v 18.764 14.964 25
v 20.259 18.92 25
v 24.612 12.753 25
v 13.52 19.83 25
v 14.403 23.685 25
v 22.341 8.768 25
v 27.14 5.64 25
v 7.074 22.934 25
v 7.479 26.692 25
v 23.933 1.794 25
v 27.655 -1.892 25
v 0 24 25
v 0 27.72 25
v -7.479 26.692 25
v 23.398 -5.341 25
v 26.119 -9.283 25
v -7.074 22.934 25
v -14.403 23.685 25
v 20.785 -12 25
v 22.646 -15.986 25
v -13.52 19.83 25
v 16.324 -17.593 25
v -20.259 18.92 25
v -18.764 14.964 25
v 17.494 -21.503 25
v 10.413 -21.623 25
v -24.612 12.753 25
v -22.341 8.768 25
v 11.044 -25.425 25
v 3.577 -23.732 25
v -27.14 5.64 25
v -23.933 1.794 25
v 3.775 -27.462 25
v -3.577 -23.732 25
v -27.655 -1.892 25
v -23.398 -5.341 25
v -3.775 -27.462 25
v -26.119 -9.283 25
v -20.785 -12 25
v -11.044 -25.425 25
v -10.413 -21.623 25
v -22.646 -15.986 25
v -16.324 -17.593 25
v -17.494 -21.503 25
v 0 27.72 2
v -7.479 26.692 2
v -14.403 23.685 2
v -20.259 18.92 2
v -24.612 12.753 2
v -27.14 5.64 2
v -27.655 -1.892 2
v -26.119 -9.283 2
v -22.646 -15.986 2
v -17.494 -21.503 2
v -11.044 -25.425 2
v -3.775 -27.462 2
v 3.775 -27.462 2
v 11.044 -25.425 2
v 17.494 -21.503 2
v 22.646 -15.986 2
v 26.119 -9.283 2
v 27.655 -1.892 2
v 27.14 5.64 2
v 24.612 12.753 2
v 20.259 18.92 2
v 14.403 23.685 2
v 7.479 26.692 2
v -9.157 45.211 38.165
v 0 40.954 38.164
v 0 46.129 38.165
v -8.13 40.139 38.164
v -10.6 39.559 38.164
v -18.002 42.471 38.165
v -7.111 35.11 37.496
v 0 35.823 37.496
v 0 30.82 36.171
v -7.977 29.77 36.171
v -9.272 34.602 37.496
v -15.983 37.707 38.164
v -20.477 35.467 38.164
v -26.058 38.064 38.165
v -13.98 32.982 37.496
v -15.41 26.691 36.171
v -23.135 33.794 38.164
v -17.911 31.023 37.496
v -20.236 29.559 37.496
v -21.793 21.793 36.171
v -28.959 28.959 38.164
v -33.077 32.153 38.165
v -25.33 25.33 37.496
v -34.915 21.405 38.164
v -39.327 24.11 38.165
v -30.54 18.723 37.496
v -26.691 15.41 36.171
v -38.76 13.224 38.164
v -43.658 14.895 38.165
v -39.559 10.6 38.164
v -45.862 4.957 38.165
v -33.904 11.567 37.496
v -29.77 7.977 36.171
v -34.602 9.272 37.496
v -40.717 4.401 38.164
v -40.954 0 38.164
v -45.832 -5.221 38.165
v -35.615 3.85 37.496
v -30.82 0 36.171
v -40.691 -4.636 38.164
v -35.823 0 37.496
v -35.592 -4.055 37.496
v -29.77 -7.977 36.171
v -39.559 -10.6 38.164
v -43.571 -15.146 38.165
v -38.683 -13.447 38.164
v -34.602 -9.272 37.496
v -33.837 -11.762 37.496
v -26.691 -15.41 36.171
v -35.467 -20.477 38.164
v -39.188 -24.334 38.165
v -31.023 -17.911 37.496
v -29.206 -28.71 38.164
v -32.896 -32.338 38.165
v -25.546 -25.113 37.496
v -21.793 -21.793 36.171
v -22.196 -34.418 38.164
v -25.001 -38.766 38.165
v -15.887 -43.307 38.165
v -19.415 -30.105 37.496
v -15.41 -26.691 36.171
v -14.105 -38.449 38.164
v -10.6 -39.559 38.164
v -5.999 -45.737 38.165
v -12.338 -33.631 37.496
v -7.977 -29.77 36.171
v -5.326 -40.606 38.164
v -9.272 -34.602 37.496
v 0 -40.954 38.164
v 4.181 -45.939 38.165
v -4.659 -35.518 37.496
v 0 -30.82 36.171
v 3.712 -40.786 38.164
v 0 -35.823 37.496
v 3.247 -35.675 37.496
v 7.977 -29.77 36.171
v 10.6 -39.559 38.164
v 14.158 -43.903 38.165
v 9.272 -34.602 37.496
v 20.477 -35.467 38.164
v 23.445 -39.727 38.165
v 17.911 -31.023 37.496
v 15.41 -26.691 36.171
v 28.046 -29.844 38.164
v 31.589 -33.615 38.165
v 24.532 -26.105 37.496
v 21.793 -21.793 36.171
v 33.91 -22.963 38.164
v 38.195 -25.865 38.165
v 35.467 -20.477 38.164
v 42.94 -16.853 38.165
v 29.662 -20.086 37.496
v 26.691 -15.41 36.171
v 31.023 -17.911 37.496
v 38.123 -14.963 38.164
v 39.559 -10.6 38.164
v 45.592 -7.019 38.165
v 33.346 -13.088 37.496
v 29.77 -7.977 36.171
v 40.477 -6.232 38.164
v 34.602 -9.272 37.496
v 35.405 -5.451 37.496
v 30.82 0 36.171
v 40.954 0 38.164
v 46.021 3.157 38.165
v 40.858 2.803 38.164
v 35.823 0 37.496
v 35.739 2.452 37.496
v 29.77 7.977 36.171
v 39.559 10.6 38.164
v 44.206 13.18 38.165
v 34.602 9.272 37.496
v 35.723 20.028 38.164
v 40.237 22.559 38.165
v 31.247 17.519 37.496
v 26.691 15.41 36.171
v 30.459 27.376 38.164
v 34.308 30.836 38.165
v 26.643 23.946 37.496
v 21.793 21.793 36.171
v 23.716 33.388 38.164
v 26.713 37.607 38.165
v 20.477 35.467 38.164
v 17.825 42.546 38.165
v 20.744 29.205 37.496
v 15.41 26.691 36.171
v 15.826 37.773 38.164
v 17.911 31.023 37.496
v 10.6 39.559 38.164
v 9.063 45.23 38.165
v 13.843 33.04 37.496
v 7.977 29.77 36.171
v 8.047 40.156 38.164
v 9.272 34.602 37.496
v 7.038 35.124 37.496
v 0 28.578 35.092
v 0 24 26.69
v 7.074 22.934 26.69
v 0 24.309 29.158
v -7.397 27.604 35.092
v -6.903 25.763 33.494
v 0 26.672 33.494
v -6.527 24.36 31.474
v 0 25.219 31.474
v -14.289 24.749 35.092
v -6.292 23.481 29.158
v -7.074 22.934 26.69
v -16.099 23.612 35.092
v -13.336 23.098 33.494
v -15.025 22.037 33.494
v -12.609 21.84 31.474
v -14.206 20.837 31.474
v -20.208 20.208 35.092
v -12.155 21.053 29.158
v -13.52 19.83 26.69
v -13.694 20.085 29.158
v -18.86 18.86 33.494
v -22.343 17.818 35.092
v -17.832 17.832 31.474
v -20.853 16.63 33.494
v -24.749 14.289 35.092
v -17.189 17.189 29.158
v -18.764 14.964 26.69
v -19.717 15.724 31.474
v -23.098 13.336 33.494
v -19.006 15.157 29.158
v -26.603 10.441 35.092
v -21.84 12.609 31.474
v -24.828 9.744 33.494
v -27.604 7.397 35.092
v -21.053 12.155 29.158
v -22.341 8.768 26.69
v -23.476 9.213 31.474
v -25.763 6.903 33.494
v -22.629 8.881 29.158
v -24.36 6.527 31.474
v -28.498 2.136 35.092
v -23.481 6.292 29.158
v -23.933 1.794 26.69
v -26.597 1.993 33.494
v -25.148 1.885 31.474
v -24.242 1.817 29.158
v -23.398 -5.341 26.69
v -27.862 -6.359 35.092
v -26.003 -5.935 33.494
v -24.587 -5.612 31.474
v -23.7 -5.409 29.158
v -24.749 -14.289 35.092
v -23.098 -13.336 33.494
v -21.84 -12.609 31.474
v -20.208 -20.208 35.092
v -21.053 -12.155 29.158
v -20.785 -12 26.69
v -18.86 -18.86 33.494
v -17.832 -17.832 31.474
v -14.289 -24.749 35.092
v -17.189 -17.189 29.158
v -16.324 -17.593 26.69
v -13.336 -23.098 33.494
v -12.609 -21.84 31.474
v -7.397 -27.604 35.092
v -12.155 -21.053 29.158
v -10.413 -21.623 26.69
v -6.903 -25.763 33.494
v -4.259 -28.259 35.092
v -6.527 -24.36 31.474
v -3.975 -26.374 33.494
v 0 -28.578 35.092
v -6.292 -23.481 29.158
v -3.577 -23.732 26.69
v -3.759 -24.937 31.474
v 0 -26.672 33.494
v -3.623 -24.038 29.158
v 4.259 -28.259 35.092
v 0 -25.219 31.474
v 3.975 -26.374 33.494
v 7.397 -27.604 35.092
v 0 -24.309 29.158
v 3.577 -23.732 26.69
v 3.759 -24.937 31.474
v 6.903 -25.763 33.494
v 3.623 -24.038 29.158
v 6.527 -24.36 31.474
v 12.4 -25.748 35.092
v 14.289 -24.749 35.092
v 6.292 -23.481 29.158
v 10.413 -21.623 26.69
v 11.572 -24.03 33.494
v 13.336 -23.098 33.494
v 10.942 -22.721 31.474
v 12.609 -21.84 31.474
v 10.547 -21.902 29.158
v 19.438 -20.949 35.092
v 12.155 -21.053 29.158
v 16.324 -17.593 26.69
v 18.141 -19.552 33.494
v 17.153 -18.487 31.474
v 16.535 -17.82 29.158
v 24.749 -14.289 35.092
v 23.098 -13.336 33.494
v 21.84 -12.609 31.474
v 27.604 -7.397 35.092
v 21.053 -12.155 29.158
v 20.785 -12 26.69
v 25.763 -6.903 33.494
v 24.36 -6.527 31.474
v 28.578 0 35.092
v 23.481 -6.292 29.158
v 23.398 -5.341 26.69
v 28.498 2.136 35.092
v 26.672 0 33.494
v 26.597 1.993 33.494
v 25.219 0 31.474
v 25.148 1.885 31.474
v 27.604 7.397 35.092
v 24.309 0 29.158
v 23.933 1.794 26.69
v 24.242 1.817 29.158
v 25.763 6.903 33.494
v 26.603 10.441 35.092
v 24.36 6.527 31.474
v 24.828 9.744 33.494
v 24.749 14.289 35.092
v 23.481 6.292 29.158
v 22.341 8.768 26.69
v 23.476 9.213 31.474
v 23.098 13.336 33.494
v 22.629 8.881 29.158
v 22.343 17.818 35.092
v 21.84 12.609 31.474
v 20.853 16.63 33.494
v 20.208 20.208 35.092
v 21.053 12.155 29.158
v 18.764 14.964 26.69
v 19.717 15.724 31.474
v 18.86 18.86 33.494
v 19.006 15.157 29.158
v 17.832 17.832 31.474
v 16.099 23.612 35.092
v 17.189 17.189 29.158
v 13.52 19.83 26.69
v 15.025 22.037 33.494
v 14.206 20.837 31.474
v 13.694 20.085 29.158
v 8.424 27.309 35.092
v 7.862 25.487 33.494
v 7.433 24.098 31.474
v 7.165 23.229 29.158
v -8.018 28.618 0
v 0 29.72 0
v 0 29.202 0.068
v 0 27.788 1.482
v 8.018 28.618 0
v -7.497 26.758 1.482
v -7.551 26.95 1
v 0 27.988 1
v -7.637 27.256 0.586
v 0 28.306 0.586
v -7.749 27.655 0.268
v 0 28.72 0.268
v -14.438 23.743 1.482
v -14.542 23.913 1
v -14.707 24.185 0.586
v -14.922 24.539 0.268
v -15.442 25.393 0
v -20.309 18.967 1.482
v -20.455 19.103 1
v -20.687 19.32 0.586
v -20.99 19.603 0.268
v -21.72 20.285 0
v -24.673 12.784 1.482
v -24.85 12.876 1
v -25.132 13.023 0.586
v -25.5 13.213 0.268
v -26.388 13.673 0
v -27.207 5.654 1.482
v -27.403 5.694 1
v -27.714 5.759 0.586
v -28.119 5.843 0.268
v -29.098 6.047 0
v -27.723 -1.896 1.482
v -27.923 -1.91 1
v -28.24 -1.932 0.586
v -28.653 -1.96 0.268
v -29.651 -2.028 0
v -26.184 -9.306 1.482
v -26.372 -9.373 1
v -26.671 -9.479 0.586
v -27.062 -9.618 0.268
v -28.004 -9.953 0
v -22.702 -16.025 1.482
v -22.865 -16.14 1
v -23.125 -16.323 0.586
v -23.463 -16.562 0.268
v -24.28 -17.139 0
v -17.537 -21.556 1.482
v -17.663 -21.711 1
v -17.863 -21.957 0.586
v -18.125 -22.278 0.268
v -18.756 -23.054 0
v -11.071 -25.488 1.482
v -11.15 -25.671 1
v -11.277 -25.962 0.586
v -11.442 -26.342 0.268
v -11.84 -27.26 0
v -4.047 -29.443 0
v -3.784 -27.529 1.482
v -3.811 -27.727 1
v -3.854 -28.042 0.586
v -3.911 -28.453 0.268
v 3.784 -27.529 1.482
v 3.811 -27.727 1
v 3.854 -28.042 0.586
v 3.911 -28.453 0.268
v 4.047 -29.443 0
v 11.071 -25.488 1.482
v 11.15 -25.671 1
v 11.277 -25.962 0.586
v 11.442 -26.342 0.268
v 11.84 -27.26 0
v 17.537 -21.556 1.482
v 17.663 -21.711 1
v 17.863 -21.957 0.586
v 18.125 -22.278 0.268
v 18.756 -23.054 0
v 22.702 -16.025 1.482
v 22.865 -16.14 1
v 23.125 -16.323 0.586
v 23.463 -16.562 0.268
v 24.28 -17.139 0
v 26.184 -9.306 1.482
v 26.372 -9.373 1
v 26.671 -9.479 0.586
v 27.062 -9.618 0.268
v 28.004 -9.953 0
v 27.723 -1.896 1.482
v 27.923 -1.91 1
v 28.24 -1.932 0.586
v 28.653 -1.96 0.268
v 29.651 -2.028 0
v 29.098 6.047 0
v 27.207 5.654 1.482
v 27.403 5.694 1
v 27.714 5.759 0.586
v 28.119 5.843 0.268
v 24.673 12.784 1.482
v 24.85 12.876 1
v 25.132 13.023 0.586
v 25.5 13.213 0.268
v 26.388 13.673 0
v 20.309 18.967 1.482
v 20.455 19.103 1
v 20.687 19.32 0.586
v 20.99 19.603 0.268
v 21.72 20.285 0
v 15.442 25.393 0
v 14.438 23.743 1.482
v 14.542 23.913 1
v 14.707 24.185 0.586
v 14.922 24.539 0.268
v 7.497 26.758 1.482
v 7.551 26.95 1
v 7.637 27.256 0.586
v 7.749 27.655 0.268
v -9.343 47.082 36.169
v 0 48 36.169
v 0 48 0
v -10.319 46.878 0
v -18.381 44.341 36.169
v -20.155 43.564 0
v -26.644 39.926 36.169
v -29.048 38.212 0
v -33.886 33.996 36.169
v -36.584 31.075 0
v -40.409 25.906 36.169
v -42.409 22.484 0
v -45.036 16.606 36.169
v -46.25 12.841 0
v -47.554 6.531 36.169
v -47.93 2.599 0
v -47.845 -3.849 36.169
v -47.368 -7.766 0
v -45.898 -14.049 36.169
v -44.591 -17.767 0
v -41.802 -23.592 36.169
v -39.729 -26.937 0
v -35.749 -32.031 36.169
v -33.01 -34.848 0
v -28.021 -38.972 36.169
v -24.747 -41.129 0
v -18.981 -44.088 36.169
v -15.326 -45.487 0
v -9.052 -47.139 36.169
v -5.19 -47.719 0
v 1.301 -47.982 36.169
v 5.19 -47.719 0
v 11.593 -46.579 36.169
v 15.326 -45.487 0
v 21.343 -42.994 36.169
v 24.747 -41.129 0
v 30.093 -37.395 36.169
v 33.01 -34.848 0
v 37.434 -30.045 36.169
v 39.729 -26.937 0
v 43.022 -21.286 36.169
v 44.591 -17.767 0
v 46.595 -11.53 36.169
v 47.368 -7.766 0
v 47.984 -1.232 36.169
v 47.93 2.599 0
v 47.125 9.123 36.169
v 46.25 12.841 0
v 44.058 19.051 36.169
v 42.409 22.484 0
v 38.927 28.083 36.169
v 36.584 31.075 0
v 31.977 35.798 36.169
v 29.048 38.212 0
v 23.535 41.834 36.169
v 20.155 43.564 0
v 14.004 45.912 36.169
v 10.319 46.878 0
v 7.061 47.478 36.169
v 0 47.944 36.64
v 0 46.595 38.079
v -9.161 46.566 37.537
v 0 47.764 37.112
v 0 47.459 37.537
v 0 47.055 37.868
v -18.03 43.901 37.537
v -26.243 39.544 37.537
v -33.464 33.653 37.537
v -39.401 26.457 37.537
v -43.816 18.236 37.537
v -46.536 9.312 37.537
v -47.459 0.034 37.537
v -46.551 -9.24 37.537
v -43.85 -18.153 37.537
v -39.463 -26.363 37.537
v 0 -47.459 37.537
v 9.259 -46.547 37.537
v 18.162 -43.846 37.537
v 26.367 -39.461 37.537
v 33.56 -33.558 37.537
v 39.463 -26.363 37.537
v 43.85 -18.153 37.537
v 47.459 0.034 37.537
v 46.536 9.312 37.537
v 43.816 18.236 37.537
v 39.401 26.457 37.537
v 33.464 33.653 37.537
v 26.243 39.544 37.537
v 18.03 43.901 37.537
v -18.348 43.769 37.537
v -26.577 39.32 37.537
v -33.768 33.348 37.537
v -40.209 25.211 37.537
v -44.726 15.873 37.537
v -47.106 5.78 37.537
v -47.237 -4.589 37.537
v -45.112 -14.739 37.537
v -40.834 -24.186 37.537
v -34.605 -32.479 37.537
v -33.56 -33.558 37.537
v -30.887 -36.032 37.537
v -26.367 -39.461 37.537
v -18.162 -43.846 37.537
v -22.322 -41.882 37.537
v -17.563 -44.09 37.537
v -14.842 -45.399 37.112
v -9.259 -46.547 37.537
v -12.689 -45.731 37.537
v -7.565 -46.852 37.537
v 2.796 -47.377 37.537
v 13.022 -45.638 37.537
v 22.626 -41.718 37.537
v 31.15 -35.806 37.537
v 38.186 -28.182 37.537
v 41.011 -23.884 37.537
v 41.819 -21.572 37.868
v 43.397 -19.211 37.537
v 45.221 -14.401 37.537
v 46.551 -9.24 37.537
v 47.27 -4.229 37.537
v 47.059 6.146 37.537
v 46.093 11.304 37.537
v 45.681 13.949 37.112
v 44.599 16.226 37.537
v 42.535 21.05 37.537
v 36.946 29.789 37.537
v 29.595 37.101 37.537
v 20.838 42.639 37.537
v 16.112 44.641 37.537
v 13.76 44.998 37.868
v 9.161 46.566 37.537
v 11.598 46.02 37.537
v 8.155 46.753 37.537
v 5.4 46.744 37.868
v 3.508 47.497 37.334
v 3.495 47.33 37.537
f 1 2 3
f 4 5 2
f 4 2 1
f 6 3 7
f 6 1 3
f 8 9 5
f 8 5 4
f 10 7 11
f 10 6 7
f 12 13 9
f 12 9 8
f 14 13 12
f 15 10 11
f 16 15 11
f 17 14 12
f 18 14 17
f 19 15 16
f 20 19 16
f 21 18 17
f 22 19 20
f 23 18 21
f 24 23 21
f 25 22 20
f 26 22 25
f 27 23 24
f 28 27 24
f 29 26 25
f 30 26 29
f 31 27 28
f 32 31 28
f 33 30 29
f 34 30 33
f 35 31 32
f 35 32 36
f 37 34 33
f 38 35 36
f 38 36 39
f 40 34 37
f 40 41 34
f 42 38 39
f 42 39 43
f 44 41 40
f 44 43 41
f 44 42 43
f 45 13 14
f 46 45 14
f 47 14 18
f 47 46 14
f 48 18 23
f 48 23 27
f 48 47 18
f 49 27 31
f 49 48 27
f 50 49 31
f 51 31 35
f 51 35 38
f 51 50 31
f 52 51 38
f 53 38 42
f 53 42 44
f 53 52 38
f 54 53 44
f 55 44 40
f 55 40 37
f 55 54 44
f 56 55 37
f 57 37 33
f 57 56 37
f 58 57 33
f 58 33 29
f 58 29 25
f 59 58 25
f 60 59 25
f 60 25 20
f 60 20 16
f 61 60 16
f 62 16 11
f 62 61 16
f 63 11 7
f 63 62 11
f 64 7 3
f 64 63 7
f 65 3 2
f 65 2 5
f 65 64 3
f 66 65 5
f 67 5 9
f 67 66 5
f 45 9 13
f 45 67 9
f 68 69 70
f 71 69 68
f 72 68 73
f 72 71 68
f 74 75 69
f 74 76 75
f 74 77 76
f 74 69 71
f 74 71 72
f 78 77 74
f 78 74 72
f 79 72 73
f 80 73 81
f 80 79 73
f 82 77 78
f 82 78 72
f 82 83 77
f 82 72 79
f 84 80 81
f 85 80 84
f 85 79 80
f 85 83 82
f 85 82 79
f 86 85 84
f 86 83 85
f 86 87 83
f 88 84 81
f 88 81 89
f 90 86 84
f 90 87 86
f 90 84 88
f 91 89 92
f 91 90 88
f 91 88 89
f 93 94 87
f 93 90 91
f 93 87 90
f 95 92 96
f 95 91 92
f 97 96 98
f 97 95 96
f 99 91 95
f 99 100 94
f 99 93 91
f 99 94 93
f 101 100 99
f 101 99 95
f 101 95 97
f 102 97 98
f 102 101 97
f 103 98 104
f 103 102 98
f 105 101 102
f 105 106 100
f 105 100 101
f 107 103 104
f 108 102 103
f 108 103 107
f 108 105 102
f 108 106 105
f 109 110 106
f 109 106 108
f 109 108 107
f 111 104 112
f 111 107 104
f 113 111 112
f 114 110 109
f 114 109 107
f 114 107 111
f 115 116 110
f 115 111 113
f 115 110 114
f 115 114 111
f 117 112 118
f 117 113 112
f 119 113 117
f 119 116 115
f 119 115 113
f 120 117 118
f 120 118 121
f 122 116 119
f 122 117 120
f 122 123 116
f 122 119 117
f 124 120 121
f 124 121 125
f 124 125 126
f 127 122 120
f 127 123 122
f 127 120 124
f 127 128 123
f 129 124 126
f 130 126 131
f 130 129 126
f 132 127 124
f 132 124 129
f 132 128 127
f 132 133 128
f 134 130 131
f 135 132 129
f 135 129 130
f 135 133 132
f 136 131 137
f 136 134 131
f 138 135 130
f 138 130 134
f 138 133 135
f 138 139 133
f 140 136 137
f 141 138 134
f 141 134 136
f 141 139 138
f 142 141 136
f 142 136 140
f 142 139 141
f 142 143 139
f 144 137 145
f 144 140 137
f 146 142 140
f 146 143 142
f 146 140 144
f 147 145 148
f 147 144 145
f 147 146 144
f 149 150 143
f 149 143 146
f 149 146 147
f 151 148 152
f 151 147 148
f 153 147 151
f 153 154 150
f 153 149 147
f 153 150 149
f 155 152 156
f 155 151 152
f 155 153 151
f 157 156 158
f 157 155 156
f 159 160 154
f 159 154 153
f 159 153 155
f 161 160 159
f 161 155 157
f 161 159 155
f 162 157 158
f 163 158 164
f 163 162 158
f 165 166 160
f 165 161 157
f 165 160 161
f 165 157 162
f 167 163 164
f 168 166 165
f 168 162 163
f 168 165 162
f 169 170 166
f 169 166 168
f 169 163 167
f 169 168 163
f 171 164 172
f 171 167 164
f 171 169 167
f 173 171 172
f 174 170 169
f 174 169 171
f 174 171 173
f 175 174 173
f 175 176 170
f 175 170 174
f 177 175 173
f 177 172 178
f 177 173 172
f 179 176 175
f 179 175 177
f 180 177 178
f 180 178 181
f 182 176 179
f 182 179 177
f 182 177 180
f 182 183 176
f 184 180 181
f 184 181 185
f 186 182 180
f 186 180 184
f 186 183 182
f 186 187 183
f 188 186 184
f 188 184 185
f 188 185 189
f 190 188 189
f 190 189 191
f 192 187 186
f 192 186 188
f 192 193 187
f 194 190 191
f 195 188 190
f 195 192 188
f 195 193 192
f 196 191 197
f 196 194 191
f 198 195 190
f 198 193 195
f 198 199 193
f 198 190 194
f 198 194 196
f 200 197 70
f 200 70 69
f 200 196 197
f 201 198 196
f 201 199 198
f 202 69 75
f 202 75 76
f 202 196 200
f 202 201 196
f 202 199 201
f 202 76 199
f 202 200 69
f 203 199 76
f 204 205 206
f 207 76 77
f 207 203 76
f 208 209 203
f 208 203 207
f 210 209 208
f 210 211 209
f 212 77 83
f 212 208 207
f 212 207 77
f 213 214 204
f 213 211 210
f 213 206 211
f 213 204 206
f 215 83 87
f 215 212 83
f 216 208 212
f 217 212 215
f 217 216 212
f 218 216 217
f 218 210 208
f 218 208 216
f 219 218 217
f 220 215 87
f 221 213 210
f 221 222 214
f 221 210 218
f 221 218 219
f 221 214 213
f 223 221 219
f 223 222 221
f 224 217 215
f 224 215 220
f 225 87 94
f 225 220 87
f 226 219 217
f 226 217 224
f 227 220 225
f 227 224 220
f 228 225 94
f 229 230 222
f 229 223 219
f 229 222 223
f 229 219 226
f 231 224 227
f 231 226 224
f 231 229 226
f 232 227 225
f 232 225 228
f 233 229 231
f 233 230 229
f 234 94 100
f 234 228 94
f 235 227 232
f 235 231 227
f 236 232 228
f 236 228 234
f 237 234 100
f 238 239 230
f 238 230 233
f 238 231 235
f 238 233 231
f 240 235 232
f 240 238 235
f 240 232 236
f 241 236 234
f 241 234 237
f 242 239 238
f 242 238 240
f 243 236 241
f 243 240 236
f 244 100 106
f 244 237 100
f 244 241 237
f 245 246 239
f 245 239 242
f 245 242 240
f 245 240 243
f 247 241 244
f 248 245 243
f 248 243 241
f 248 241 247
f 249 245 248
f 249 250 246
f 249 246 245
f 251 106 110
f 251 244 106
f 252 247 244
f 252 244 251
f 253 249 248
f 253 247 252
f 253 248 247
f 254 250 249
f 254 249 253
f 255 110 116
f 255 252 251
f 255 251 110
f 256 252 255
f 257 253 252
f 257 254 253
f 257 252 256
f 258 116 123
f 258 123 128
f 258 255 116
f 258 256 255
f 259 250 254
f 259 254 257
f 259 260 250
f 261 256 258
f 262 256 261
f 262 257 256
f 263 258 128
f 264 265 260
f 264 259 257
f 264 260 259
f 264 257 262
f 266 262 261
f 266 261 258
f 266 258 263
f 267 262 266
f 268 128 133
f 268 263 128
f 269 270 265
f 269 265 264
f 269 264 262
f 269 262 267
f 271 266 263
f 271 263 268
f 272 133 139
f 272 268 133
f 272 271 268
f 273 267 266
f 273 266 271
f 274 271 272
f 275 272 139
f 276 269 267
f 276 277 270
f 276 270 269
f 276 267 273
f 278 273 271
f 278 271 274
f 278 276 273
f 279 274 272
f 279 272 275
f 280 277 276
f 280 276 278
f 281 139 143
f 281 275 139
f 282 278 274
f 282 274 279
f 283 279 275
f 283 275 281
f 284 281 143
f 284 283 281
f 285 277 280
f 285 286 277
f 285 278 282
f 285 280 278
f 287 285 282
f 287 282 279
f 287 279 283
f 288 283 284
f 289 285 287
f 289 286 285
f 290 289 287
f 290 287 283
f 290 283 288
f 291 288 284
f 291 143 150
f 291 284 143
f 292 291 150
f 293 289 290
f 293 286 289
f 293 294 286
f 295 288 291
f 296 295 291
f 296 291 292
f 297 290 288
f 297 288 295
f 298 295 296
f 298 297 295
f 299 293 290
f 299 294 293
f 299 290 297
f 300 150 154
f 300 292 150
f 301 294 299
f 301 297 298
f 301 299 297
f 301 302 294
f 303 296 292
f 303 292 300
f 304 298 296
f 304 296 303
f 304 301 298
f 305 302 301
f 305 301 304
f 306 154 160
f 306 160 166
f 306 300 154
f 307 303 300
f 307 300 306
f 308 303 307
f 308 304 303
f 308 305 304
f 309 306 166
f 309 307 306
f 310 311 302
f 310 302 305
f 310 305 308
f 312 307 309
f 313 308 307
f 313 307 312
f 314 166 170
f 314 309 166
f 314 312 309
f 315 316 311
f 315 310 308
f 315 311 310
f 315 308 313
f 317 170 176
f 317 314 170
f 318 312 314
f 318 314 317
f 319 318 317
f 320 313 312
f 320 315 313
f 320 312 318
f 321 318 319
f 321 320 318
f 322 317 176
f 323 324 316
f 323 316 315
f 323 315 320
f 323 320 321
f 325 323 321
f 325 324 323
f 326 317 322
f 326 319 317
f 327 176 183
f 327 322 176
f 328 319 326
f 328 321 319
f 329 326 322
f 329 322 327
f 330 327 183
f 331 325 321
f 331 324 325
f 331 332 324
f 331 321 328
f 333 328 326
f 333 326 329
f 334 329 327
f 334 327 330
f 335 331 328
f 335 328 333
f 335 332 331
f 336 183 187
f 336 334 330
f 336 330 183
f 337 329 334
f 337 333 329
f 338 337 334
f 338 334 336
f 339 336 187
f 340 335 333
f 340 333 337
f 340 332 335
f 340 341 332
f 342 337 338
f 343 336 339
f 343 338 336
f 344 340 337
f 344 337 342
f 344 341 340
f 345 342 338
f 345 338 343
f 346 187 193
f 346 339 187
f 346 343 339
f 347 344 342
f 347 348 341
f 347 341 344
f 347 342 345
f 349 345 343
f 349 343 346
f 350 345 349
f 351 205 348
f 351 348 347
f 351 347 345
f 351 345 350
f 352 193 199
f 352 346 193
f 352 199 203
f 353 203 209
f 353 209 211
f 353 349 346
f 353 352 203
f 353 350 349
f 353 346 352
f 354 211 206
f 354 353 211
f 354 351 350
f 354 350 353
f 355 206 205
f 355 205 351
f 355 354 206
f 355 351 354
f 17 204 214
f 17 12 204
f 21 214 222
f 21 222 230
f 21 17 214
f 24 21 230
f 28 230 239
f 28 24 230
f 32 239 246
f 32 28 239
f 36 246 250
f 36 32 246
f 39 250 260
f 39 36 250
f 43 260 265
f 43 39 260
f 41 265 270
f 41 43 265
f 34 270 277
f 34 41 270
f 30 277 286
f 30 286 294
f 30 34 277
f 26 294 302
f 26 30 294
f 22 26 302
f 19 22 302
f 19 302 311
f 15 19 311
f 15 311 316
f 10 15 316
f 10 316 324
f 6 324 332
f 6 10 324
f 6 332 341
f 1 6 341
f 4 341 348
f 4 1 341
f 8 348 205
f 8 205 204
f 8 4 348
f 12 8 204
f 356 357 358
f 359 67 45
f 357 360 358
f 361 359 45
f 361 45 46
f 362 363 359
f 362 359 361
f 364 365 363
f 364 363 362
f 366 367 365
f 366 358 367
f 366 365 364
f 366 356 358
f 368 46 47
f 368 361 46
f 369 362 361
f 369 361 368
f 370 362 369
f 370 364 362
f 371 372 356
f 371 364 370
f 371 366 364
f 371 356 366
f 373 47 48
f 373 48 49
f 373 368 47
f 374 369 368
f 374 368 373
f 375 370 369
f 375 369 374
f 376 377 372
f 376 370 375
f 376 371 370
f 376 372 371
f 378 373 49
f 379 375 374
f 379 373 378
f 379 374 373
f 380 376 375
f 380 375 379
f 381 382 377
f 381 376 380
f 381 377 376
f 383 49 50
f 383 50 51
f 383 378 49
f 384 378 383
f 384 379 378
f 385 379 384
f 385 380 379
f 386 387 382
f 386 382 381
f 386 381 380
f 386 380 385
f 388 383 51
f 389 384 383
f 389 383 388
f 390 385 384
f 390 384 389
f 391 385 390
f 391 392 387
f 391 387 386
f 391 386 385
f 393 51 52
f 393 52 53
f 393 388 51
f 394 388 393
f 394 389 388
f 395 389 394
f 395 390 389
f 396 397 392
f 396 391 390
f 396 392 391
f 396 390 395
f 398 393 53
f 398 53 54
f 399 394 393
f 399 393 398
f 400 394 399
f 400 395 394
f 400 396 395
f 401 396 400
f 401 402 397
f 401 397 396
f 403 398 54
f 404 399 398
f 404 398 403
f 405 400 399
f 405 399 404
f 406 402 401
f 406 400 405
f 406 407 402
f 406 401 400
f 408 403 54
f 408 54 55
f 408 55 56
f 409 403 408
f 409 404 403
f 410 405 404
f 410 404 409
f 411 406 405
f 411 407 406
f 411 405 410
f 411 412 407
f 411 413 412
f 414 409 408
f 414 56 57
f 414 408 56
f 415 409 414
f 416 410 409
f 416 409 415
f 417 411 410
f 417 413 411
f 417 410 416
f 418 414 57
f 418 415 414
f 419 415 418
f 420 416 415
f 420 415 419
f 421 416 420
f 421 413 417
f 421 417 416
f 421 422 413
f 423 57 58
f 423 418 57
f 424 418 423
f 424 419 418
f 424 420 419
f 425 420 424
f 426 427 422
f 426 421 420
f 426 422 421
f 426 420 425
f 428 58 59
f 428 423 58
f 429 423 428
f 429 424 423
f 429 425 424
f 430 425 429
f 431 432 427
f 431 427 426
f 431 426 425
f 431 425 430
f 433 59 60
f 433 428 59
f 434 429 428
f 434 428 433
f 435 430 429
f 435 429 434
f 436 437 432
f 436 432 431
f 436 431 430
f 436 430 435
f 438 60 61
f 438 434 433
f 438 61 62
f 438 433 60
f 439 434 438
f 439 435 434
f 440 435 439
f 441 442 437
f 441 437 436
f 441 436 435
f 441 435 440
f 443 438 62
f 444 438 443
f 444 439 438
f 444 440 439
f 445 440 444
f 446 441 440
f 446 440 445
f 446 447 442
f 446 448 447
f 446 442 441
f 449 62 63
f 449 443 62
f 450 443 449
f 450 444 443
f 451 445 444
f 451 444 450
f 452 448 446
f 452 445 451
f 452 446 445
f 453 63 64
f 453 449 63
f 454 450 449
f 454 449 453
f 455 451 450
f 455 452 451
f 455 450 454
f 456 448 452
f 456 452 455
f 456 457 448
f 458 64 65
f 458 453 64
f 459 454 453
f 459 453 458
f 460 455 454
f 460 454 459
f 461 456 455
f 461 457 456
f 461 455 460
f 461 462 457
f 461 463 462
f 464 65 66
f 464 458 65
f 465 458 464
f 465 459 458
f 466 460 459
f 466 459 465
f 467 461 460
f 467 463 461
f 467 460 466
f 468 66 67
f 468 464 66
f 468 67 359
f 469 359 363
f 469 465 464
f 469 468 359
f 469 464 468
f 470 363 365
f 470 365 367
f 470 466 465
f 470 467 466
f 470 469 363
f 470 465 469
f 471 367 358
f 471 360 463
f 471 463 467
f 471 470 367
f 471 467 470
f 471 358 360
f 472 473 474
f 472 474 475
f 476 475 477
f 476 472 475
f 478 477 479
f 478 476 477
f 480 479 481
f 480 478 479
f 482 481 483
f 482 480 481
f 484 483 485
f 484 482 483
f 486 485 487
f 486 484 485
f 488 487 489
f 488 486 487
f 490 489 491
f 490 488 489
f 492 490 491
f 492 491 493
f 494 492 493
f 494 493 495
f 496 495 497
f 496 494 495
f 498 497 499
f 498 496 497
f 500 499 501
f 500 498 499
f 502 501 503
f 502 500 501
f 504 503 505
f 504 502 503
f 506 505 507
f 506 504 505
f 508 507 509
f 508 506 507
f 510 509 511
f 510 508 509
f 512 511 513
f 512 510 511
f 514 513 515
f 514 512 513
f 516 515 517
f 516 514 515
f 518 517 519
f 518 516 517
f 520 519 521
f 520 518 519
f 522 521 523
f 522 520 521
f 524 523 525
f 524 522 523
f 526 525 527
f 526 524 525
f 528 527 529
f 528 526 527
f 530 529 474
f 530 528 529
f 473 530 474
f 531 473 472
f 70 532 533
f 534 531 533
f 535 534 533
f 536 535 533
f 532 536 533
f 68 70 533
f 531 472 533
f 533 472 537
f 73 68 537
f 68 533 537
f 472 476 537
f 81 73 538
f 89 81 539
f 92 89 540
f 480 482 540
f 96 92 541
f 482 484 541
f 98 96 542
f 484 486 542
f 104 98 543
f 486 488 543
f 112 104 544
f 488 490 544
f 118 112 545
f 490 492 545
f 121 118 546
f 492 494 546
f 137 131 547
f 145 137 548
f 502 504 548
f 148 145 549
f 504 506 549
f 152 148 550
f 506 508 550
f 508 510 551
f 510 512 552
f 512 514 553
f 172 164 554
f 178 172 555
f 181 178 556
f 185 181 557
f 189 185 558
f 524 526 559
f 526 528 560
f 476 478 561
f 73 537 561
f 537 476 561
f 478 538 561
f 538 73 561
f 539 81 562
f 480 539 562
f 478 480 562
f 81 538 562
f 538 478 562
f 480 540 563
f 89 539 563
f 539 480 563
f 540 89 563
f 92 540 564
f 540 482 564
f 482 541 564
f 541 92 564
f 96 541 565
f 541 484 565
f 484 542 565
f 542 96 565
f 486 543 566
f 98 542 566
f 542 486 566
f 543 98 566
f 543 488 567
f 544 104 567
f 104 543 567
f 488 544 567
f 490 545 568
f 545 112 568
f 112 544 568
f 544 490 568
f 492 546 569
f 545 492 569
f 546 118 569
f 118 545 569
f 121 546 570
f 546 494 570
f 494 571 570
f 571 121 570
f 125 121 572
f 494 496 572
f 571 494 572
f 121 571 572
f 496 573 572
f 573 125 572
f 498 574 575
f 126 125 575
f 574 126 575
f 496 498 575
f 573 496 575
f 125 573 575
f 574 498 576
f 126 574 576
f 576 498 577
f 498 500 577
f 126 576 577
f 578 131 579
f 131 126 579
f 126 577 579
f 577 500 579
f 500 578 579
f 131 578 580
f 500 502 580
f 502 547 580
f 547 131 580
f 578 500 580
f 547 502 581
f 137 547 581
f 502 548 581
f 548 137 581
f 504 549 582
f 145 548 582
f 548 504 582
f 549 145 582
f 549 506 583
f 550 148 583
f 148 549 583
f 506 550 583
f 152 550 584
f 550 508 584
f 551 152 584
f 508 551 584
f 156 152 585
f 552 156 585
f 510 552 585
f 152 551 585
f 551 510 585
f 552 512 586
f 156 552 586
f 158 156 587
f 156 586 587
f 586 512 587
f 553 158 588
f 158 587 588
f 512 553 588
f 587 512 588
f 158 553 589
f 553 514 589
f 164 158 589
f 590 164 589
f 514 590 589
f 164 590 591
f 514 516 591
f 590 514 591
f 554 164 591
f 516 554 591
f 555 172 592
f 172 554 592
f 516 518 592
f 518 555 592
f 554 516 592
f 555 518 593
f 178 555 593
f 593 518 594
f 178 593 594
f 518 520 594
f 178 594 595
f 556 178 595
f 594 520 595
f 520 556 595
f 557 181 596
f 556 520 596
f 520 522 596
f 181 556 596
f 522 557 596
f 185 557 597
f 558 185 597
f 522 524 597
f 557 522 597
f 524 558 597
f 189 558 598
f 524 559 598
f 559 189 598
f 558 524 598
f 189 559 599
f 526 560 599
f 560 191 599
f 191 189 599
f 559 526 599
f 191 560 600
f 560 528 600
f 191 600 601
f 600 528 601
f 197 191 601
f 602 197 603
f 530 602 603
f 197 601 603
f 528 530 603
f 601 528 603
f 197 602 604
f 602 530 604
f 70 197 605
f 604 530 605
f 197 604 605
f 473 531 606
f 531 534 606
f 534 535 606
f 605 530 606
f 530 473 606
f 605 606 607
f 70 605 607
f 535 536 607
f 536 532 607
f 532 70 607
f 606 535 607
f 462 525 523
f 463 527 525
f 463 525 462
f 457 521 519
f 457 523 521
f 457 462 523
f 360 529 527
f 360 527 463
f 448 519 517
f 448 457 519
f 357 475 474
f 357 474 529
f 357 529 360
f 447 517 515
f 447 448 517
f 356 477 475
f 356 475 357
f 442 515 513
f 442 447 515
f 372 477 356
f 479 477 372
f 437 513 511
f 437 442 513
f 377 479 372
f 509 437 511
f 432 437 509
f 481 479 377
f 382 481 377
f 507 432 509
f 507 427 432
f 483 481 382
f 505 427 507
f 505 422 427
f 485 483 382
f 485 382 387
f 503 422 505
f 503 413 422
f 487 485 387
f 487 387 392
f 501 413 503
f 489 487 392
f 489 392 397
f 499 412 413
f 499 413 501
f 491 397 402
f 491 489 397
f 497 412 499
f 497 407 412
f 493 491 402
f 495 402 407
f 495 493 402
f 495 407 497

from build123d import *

# Parameters (mm, degrees)
F2_R = 2


with BuildPart() as f1:
    # F0 (on Right) → F1 (revolve)
    with BuildSketch(Plane.YZ):
        with BuildLine():
            Line((27.72, 25), (27.72, 0))
            Line((27.72, 0), (48, 0))
            Line((48, 0), (48, 38))
            ThreePointArc((48, 38), (39.310272, 38.023274), (30.820276, 36.170745))
            ThreePointArc((30.820276, 36.170745), (25.882203, 32.529384), (24, 26.689746))
            Line((24, 26.689746), (24, 25))
            Line((24, 25), (27.72, 25))
        make_face()
    revolve(axis=Axis((0, 0, 20.223878), (0, 0, 1)))

    # F2
    f2_edges = [f1.edges().sort_by_distance(p)[0] for p in [
        (0, -48, 38),
        (0, -27.72, 0),
    ]]
    fillet(f2_edges, radius=F2_R)


solid = f1.part
